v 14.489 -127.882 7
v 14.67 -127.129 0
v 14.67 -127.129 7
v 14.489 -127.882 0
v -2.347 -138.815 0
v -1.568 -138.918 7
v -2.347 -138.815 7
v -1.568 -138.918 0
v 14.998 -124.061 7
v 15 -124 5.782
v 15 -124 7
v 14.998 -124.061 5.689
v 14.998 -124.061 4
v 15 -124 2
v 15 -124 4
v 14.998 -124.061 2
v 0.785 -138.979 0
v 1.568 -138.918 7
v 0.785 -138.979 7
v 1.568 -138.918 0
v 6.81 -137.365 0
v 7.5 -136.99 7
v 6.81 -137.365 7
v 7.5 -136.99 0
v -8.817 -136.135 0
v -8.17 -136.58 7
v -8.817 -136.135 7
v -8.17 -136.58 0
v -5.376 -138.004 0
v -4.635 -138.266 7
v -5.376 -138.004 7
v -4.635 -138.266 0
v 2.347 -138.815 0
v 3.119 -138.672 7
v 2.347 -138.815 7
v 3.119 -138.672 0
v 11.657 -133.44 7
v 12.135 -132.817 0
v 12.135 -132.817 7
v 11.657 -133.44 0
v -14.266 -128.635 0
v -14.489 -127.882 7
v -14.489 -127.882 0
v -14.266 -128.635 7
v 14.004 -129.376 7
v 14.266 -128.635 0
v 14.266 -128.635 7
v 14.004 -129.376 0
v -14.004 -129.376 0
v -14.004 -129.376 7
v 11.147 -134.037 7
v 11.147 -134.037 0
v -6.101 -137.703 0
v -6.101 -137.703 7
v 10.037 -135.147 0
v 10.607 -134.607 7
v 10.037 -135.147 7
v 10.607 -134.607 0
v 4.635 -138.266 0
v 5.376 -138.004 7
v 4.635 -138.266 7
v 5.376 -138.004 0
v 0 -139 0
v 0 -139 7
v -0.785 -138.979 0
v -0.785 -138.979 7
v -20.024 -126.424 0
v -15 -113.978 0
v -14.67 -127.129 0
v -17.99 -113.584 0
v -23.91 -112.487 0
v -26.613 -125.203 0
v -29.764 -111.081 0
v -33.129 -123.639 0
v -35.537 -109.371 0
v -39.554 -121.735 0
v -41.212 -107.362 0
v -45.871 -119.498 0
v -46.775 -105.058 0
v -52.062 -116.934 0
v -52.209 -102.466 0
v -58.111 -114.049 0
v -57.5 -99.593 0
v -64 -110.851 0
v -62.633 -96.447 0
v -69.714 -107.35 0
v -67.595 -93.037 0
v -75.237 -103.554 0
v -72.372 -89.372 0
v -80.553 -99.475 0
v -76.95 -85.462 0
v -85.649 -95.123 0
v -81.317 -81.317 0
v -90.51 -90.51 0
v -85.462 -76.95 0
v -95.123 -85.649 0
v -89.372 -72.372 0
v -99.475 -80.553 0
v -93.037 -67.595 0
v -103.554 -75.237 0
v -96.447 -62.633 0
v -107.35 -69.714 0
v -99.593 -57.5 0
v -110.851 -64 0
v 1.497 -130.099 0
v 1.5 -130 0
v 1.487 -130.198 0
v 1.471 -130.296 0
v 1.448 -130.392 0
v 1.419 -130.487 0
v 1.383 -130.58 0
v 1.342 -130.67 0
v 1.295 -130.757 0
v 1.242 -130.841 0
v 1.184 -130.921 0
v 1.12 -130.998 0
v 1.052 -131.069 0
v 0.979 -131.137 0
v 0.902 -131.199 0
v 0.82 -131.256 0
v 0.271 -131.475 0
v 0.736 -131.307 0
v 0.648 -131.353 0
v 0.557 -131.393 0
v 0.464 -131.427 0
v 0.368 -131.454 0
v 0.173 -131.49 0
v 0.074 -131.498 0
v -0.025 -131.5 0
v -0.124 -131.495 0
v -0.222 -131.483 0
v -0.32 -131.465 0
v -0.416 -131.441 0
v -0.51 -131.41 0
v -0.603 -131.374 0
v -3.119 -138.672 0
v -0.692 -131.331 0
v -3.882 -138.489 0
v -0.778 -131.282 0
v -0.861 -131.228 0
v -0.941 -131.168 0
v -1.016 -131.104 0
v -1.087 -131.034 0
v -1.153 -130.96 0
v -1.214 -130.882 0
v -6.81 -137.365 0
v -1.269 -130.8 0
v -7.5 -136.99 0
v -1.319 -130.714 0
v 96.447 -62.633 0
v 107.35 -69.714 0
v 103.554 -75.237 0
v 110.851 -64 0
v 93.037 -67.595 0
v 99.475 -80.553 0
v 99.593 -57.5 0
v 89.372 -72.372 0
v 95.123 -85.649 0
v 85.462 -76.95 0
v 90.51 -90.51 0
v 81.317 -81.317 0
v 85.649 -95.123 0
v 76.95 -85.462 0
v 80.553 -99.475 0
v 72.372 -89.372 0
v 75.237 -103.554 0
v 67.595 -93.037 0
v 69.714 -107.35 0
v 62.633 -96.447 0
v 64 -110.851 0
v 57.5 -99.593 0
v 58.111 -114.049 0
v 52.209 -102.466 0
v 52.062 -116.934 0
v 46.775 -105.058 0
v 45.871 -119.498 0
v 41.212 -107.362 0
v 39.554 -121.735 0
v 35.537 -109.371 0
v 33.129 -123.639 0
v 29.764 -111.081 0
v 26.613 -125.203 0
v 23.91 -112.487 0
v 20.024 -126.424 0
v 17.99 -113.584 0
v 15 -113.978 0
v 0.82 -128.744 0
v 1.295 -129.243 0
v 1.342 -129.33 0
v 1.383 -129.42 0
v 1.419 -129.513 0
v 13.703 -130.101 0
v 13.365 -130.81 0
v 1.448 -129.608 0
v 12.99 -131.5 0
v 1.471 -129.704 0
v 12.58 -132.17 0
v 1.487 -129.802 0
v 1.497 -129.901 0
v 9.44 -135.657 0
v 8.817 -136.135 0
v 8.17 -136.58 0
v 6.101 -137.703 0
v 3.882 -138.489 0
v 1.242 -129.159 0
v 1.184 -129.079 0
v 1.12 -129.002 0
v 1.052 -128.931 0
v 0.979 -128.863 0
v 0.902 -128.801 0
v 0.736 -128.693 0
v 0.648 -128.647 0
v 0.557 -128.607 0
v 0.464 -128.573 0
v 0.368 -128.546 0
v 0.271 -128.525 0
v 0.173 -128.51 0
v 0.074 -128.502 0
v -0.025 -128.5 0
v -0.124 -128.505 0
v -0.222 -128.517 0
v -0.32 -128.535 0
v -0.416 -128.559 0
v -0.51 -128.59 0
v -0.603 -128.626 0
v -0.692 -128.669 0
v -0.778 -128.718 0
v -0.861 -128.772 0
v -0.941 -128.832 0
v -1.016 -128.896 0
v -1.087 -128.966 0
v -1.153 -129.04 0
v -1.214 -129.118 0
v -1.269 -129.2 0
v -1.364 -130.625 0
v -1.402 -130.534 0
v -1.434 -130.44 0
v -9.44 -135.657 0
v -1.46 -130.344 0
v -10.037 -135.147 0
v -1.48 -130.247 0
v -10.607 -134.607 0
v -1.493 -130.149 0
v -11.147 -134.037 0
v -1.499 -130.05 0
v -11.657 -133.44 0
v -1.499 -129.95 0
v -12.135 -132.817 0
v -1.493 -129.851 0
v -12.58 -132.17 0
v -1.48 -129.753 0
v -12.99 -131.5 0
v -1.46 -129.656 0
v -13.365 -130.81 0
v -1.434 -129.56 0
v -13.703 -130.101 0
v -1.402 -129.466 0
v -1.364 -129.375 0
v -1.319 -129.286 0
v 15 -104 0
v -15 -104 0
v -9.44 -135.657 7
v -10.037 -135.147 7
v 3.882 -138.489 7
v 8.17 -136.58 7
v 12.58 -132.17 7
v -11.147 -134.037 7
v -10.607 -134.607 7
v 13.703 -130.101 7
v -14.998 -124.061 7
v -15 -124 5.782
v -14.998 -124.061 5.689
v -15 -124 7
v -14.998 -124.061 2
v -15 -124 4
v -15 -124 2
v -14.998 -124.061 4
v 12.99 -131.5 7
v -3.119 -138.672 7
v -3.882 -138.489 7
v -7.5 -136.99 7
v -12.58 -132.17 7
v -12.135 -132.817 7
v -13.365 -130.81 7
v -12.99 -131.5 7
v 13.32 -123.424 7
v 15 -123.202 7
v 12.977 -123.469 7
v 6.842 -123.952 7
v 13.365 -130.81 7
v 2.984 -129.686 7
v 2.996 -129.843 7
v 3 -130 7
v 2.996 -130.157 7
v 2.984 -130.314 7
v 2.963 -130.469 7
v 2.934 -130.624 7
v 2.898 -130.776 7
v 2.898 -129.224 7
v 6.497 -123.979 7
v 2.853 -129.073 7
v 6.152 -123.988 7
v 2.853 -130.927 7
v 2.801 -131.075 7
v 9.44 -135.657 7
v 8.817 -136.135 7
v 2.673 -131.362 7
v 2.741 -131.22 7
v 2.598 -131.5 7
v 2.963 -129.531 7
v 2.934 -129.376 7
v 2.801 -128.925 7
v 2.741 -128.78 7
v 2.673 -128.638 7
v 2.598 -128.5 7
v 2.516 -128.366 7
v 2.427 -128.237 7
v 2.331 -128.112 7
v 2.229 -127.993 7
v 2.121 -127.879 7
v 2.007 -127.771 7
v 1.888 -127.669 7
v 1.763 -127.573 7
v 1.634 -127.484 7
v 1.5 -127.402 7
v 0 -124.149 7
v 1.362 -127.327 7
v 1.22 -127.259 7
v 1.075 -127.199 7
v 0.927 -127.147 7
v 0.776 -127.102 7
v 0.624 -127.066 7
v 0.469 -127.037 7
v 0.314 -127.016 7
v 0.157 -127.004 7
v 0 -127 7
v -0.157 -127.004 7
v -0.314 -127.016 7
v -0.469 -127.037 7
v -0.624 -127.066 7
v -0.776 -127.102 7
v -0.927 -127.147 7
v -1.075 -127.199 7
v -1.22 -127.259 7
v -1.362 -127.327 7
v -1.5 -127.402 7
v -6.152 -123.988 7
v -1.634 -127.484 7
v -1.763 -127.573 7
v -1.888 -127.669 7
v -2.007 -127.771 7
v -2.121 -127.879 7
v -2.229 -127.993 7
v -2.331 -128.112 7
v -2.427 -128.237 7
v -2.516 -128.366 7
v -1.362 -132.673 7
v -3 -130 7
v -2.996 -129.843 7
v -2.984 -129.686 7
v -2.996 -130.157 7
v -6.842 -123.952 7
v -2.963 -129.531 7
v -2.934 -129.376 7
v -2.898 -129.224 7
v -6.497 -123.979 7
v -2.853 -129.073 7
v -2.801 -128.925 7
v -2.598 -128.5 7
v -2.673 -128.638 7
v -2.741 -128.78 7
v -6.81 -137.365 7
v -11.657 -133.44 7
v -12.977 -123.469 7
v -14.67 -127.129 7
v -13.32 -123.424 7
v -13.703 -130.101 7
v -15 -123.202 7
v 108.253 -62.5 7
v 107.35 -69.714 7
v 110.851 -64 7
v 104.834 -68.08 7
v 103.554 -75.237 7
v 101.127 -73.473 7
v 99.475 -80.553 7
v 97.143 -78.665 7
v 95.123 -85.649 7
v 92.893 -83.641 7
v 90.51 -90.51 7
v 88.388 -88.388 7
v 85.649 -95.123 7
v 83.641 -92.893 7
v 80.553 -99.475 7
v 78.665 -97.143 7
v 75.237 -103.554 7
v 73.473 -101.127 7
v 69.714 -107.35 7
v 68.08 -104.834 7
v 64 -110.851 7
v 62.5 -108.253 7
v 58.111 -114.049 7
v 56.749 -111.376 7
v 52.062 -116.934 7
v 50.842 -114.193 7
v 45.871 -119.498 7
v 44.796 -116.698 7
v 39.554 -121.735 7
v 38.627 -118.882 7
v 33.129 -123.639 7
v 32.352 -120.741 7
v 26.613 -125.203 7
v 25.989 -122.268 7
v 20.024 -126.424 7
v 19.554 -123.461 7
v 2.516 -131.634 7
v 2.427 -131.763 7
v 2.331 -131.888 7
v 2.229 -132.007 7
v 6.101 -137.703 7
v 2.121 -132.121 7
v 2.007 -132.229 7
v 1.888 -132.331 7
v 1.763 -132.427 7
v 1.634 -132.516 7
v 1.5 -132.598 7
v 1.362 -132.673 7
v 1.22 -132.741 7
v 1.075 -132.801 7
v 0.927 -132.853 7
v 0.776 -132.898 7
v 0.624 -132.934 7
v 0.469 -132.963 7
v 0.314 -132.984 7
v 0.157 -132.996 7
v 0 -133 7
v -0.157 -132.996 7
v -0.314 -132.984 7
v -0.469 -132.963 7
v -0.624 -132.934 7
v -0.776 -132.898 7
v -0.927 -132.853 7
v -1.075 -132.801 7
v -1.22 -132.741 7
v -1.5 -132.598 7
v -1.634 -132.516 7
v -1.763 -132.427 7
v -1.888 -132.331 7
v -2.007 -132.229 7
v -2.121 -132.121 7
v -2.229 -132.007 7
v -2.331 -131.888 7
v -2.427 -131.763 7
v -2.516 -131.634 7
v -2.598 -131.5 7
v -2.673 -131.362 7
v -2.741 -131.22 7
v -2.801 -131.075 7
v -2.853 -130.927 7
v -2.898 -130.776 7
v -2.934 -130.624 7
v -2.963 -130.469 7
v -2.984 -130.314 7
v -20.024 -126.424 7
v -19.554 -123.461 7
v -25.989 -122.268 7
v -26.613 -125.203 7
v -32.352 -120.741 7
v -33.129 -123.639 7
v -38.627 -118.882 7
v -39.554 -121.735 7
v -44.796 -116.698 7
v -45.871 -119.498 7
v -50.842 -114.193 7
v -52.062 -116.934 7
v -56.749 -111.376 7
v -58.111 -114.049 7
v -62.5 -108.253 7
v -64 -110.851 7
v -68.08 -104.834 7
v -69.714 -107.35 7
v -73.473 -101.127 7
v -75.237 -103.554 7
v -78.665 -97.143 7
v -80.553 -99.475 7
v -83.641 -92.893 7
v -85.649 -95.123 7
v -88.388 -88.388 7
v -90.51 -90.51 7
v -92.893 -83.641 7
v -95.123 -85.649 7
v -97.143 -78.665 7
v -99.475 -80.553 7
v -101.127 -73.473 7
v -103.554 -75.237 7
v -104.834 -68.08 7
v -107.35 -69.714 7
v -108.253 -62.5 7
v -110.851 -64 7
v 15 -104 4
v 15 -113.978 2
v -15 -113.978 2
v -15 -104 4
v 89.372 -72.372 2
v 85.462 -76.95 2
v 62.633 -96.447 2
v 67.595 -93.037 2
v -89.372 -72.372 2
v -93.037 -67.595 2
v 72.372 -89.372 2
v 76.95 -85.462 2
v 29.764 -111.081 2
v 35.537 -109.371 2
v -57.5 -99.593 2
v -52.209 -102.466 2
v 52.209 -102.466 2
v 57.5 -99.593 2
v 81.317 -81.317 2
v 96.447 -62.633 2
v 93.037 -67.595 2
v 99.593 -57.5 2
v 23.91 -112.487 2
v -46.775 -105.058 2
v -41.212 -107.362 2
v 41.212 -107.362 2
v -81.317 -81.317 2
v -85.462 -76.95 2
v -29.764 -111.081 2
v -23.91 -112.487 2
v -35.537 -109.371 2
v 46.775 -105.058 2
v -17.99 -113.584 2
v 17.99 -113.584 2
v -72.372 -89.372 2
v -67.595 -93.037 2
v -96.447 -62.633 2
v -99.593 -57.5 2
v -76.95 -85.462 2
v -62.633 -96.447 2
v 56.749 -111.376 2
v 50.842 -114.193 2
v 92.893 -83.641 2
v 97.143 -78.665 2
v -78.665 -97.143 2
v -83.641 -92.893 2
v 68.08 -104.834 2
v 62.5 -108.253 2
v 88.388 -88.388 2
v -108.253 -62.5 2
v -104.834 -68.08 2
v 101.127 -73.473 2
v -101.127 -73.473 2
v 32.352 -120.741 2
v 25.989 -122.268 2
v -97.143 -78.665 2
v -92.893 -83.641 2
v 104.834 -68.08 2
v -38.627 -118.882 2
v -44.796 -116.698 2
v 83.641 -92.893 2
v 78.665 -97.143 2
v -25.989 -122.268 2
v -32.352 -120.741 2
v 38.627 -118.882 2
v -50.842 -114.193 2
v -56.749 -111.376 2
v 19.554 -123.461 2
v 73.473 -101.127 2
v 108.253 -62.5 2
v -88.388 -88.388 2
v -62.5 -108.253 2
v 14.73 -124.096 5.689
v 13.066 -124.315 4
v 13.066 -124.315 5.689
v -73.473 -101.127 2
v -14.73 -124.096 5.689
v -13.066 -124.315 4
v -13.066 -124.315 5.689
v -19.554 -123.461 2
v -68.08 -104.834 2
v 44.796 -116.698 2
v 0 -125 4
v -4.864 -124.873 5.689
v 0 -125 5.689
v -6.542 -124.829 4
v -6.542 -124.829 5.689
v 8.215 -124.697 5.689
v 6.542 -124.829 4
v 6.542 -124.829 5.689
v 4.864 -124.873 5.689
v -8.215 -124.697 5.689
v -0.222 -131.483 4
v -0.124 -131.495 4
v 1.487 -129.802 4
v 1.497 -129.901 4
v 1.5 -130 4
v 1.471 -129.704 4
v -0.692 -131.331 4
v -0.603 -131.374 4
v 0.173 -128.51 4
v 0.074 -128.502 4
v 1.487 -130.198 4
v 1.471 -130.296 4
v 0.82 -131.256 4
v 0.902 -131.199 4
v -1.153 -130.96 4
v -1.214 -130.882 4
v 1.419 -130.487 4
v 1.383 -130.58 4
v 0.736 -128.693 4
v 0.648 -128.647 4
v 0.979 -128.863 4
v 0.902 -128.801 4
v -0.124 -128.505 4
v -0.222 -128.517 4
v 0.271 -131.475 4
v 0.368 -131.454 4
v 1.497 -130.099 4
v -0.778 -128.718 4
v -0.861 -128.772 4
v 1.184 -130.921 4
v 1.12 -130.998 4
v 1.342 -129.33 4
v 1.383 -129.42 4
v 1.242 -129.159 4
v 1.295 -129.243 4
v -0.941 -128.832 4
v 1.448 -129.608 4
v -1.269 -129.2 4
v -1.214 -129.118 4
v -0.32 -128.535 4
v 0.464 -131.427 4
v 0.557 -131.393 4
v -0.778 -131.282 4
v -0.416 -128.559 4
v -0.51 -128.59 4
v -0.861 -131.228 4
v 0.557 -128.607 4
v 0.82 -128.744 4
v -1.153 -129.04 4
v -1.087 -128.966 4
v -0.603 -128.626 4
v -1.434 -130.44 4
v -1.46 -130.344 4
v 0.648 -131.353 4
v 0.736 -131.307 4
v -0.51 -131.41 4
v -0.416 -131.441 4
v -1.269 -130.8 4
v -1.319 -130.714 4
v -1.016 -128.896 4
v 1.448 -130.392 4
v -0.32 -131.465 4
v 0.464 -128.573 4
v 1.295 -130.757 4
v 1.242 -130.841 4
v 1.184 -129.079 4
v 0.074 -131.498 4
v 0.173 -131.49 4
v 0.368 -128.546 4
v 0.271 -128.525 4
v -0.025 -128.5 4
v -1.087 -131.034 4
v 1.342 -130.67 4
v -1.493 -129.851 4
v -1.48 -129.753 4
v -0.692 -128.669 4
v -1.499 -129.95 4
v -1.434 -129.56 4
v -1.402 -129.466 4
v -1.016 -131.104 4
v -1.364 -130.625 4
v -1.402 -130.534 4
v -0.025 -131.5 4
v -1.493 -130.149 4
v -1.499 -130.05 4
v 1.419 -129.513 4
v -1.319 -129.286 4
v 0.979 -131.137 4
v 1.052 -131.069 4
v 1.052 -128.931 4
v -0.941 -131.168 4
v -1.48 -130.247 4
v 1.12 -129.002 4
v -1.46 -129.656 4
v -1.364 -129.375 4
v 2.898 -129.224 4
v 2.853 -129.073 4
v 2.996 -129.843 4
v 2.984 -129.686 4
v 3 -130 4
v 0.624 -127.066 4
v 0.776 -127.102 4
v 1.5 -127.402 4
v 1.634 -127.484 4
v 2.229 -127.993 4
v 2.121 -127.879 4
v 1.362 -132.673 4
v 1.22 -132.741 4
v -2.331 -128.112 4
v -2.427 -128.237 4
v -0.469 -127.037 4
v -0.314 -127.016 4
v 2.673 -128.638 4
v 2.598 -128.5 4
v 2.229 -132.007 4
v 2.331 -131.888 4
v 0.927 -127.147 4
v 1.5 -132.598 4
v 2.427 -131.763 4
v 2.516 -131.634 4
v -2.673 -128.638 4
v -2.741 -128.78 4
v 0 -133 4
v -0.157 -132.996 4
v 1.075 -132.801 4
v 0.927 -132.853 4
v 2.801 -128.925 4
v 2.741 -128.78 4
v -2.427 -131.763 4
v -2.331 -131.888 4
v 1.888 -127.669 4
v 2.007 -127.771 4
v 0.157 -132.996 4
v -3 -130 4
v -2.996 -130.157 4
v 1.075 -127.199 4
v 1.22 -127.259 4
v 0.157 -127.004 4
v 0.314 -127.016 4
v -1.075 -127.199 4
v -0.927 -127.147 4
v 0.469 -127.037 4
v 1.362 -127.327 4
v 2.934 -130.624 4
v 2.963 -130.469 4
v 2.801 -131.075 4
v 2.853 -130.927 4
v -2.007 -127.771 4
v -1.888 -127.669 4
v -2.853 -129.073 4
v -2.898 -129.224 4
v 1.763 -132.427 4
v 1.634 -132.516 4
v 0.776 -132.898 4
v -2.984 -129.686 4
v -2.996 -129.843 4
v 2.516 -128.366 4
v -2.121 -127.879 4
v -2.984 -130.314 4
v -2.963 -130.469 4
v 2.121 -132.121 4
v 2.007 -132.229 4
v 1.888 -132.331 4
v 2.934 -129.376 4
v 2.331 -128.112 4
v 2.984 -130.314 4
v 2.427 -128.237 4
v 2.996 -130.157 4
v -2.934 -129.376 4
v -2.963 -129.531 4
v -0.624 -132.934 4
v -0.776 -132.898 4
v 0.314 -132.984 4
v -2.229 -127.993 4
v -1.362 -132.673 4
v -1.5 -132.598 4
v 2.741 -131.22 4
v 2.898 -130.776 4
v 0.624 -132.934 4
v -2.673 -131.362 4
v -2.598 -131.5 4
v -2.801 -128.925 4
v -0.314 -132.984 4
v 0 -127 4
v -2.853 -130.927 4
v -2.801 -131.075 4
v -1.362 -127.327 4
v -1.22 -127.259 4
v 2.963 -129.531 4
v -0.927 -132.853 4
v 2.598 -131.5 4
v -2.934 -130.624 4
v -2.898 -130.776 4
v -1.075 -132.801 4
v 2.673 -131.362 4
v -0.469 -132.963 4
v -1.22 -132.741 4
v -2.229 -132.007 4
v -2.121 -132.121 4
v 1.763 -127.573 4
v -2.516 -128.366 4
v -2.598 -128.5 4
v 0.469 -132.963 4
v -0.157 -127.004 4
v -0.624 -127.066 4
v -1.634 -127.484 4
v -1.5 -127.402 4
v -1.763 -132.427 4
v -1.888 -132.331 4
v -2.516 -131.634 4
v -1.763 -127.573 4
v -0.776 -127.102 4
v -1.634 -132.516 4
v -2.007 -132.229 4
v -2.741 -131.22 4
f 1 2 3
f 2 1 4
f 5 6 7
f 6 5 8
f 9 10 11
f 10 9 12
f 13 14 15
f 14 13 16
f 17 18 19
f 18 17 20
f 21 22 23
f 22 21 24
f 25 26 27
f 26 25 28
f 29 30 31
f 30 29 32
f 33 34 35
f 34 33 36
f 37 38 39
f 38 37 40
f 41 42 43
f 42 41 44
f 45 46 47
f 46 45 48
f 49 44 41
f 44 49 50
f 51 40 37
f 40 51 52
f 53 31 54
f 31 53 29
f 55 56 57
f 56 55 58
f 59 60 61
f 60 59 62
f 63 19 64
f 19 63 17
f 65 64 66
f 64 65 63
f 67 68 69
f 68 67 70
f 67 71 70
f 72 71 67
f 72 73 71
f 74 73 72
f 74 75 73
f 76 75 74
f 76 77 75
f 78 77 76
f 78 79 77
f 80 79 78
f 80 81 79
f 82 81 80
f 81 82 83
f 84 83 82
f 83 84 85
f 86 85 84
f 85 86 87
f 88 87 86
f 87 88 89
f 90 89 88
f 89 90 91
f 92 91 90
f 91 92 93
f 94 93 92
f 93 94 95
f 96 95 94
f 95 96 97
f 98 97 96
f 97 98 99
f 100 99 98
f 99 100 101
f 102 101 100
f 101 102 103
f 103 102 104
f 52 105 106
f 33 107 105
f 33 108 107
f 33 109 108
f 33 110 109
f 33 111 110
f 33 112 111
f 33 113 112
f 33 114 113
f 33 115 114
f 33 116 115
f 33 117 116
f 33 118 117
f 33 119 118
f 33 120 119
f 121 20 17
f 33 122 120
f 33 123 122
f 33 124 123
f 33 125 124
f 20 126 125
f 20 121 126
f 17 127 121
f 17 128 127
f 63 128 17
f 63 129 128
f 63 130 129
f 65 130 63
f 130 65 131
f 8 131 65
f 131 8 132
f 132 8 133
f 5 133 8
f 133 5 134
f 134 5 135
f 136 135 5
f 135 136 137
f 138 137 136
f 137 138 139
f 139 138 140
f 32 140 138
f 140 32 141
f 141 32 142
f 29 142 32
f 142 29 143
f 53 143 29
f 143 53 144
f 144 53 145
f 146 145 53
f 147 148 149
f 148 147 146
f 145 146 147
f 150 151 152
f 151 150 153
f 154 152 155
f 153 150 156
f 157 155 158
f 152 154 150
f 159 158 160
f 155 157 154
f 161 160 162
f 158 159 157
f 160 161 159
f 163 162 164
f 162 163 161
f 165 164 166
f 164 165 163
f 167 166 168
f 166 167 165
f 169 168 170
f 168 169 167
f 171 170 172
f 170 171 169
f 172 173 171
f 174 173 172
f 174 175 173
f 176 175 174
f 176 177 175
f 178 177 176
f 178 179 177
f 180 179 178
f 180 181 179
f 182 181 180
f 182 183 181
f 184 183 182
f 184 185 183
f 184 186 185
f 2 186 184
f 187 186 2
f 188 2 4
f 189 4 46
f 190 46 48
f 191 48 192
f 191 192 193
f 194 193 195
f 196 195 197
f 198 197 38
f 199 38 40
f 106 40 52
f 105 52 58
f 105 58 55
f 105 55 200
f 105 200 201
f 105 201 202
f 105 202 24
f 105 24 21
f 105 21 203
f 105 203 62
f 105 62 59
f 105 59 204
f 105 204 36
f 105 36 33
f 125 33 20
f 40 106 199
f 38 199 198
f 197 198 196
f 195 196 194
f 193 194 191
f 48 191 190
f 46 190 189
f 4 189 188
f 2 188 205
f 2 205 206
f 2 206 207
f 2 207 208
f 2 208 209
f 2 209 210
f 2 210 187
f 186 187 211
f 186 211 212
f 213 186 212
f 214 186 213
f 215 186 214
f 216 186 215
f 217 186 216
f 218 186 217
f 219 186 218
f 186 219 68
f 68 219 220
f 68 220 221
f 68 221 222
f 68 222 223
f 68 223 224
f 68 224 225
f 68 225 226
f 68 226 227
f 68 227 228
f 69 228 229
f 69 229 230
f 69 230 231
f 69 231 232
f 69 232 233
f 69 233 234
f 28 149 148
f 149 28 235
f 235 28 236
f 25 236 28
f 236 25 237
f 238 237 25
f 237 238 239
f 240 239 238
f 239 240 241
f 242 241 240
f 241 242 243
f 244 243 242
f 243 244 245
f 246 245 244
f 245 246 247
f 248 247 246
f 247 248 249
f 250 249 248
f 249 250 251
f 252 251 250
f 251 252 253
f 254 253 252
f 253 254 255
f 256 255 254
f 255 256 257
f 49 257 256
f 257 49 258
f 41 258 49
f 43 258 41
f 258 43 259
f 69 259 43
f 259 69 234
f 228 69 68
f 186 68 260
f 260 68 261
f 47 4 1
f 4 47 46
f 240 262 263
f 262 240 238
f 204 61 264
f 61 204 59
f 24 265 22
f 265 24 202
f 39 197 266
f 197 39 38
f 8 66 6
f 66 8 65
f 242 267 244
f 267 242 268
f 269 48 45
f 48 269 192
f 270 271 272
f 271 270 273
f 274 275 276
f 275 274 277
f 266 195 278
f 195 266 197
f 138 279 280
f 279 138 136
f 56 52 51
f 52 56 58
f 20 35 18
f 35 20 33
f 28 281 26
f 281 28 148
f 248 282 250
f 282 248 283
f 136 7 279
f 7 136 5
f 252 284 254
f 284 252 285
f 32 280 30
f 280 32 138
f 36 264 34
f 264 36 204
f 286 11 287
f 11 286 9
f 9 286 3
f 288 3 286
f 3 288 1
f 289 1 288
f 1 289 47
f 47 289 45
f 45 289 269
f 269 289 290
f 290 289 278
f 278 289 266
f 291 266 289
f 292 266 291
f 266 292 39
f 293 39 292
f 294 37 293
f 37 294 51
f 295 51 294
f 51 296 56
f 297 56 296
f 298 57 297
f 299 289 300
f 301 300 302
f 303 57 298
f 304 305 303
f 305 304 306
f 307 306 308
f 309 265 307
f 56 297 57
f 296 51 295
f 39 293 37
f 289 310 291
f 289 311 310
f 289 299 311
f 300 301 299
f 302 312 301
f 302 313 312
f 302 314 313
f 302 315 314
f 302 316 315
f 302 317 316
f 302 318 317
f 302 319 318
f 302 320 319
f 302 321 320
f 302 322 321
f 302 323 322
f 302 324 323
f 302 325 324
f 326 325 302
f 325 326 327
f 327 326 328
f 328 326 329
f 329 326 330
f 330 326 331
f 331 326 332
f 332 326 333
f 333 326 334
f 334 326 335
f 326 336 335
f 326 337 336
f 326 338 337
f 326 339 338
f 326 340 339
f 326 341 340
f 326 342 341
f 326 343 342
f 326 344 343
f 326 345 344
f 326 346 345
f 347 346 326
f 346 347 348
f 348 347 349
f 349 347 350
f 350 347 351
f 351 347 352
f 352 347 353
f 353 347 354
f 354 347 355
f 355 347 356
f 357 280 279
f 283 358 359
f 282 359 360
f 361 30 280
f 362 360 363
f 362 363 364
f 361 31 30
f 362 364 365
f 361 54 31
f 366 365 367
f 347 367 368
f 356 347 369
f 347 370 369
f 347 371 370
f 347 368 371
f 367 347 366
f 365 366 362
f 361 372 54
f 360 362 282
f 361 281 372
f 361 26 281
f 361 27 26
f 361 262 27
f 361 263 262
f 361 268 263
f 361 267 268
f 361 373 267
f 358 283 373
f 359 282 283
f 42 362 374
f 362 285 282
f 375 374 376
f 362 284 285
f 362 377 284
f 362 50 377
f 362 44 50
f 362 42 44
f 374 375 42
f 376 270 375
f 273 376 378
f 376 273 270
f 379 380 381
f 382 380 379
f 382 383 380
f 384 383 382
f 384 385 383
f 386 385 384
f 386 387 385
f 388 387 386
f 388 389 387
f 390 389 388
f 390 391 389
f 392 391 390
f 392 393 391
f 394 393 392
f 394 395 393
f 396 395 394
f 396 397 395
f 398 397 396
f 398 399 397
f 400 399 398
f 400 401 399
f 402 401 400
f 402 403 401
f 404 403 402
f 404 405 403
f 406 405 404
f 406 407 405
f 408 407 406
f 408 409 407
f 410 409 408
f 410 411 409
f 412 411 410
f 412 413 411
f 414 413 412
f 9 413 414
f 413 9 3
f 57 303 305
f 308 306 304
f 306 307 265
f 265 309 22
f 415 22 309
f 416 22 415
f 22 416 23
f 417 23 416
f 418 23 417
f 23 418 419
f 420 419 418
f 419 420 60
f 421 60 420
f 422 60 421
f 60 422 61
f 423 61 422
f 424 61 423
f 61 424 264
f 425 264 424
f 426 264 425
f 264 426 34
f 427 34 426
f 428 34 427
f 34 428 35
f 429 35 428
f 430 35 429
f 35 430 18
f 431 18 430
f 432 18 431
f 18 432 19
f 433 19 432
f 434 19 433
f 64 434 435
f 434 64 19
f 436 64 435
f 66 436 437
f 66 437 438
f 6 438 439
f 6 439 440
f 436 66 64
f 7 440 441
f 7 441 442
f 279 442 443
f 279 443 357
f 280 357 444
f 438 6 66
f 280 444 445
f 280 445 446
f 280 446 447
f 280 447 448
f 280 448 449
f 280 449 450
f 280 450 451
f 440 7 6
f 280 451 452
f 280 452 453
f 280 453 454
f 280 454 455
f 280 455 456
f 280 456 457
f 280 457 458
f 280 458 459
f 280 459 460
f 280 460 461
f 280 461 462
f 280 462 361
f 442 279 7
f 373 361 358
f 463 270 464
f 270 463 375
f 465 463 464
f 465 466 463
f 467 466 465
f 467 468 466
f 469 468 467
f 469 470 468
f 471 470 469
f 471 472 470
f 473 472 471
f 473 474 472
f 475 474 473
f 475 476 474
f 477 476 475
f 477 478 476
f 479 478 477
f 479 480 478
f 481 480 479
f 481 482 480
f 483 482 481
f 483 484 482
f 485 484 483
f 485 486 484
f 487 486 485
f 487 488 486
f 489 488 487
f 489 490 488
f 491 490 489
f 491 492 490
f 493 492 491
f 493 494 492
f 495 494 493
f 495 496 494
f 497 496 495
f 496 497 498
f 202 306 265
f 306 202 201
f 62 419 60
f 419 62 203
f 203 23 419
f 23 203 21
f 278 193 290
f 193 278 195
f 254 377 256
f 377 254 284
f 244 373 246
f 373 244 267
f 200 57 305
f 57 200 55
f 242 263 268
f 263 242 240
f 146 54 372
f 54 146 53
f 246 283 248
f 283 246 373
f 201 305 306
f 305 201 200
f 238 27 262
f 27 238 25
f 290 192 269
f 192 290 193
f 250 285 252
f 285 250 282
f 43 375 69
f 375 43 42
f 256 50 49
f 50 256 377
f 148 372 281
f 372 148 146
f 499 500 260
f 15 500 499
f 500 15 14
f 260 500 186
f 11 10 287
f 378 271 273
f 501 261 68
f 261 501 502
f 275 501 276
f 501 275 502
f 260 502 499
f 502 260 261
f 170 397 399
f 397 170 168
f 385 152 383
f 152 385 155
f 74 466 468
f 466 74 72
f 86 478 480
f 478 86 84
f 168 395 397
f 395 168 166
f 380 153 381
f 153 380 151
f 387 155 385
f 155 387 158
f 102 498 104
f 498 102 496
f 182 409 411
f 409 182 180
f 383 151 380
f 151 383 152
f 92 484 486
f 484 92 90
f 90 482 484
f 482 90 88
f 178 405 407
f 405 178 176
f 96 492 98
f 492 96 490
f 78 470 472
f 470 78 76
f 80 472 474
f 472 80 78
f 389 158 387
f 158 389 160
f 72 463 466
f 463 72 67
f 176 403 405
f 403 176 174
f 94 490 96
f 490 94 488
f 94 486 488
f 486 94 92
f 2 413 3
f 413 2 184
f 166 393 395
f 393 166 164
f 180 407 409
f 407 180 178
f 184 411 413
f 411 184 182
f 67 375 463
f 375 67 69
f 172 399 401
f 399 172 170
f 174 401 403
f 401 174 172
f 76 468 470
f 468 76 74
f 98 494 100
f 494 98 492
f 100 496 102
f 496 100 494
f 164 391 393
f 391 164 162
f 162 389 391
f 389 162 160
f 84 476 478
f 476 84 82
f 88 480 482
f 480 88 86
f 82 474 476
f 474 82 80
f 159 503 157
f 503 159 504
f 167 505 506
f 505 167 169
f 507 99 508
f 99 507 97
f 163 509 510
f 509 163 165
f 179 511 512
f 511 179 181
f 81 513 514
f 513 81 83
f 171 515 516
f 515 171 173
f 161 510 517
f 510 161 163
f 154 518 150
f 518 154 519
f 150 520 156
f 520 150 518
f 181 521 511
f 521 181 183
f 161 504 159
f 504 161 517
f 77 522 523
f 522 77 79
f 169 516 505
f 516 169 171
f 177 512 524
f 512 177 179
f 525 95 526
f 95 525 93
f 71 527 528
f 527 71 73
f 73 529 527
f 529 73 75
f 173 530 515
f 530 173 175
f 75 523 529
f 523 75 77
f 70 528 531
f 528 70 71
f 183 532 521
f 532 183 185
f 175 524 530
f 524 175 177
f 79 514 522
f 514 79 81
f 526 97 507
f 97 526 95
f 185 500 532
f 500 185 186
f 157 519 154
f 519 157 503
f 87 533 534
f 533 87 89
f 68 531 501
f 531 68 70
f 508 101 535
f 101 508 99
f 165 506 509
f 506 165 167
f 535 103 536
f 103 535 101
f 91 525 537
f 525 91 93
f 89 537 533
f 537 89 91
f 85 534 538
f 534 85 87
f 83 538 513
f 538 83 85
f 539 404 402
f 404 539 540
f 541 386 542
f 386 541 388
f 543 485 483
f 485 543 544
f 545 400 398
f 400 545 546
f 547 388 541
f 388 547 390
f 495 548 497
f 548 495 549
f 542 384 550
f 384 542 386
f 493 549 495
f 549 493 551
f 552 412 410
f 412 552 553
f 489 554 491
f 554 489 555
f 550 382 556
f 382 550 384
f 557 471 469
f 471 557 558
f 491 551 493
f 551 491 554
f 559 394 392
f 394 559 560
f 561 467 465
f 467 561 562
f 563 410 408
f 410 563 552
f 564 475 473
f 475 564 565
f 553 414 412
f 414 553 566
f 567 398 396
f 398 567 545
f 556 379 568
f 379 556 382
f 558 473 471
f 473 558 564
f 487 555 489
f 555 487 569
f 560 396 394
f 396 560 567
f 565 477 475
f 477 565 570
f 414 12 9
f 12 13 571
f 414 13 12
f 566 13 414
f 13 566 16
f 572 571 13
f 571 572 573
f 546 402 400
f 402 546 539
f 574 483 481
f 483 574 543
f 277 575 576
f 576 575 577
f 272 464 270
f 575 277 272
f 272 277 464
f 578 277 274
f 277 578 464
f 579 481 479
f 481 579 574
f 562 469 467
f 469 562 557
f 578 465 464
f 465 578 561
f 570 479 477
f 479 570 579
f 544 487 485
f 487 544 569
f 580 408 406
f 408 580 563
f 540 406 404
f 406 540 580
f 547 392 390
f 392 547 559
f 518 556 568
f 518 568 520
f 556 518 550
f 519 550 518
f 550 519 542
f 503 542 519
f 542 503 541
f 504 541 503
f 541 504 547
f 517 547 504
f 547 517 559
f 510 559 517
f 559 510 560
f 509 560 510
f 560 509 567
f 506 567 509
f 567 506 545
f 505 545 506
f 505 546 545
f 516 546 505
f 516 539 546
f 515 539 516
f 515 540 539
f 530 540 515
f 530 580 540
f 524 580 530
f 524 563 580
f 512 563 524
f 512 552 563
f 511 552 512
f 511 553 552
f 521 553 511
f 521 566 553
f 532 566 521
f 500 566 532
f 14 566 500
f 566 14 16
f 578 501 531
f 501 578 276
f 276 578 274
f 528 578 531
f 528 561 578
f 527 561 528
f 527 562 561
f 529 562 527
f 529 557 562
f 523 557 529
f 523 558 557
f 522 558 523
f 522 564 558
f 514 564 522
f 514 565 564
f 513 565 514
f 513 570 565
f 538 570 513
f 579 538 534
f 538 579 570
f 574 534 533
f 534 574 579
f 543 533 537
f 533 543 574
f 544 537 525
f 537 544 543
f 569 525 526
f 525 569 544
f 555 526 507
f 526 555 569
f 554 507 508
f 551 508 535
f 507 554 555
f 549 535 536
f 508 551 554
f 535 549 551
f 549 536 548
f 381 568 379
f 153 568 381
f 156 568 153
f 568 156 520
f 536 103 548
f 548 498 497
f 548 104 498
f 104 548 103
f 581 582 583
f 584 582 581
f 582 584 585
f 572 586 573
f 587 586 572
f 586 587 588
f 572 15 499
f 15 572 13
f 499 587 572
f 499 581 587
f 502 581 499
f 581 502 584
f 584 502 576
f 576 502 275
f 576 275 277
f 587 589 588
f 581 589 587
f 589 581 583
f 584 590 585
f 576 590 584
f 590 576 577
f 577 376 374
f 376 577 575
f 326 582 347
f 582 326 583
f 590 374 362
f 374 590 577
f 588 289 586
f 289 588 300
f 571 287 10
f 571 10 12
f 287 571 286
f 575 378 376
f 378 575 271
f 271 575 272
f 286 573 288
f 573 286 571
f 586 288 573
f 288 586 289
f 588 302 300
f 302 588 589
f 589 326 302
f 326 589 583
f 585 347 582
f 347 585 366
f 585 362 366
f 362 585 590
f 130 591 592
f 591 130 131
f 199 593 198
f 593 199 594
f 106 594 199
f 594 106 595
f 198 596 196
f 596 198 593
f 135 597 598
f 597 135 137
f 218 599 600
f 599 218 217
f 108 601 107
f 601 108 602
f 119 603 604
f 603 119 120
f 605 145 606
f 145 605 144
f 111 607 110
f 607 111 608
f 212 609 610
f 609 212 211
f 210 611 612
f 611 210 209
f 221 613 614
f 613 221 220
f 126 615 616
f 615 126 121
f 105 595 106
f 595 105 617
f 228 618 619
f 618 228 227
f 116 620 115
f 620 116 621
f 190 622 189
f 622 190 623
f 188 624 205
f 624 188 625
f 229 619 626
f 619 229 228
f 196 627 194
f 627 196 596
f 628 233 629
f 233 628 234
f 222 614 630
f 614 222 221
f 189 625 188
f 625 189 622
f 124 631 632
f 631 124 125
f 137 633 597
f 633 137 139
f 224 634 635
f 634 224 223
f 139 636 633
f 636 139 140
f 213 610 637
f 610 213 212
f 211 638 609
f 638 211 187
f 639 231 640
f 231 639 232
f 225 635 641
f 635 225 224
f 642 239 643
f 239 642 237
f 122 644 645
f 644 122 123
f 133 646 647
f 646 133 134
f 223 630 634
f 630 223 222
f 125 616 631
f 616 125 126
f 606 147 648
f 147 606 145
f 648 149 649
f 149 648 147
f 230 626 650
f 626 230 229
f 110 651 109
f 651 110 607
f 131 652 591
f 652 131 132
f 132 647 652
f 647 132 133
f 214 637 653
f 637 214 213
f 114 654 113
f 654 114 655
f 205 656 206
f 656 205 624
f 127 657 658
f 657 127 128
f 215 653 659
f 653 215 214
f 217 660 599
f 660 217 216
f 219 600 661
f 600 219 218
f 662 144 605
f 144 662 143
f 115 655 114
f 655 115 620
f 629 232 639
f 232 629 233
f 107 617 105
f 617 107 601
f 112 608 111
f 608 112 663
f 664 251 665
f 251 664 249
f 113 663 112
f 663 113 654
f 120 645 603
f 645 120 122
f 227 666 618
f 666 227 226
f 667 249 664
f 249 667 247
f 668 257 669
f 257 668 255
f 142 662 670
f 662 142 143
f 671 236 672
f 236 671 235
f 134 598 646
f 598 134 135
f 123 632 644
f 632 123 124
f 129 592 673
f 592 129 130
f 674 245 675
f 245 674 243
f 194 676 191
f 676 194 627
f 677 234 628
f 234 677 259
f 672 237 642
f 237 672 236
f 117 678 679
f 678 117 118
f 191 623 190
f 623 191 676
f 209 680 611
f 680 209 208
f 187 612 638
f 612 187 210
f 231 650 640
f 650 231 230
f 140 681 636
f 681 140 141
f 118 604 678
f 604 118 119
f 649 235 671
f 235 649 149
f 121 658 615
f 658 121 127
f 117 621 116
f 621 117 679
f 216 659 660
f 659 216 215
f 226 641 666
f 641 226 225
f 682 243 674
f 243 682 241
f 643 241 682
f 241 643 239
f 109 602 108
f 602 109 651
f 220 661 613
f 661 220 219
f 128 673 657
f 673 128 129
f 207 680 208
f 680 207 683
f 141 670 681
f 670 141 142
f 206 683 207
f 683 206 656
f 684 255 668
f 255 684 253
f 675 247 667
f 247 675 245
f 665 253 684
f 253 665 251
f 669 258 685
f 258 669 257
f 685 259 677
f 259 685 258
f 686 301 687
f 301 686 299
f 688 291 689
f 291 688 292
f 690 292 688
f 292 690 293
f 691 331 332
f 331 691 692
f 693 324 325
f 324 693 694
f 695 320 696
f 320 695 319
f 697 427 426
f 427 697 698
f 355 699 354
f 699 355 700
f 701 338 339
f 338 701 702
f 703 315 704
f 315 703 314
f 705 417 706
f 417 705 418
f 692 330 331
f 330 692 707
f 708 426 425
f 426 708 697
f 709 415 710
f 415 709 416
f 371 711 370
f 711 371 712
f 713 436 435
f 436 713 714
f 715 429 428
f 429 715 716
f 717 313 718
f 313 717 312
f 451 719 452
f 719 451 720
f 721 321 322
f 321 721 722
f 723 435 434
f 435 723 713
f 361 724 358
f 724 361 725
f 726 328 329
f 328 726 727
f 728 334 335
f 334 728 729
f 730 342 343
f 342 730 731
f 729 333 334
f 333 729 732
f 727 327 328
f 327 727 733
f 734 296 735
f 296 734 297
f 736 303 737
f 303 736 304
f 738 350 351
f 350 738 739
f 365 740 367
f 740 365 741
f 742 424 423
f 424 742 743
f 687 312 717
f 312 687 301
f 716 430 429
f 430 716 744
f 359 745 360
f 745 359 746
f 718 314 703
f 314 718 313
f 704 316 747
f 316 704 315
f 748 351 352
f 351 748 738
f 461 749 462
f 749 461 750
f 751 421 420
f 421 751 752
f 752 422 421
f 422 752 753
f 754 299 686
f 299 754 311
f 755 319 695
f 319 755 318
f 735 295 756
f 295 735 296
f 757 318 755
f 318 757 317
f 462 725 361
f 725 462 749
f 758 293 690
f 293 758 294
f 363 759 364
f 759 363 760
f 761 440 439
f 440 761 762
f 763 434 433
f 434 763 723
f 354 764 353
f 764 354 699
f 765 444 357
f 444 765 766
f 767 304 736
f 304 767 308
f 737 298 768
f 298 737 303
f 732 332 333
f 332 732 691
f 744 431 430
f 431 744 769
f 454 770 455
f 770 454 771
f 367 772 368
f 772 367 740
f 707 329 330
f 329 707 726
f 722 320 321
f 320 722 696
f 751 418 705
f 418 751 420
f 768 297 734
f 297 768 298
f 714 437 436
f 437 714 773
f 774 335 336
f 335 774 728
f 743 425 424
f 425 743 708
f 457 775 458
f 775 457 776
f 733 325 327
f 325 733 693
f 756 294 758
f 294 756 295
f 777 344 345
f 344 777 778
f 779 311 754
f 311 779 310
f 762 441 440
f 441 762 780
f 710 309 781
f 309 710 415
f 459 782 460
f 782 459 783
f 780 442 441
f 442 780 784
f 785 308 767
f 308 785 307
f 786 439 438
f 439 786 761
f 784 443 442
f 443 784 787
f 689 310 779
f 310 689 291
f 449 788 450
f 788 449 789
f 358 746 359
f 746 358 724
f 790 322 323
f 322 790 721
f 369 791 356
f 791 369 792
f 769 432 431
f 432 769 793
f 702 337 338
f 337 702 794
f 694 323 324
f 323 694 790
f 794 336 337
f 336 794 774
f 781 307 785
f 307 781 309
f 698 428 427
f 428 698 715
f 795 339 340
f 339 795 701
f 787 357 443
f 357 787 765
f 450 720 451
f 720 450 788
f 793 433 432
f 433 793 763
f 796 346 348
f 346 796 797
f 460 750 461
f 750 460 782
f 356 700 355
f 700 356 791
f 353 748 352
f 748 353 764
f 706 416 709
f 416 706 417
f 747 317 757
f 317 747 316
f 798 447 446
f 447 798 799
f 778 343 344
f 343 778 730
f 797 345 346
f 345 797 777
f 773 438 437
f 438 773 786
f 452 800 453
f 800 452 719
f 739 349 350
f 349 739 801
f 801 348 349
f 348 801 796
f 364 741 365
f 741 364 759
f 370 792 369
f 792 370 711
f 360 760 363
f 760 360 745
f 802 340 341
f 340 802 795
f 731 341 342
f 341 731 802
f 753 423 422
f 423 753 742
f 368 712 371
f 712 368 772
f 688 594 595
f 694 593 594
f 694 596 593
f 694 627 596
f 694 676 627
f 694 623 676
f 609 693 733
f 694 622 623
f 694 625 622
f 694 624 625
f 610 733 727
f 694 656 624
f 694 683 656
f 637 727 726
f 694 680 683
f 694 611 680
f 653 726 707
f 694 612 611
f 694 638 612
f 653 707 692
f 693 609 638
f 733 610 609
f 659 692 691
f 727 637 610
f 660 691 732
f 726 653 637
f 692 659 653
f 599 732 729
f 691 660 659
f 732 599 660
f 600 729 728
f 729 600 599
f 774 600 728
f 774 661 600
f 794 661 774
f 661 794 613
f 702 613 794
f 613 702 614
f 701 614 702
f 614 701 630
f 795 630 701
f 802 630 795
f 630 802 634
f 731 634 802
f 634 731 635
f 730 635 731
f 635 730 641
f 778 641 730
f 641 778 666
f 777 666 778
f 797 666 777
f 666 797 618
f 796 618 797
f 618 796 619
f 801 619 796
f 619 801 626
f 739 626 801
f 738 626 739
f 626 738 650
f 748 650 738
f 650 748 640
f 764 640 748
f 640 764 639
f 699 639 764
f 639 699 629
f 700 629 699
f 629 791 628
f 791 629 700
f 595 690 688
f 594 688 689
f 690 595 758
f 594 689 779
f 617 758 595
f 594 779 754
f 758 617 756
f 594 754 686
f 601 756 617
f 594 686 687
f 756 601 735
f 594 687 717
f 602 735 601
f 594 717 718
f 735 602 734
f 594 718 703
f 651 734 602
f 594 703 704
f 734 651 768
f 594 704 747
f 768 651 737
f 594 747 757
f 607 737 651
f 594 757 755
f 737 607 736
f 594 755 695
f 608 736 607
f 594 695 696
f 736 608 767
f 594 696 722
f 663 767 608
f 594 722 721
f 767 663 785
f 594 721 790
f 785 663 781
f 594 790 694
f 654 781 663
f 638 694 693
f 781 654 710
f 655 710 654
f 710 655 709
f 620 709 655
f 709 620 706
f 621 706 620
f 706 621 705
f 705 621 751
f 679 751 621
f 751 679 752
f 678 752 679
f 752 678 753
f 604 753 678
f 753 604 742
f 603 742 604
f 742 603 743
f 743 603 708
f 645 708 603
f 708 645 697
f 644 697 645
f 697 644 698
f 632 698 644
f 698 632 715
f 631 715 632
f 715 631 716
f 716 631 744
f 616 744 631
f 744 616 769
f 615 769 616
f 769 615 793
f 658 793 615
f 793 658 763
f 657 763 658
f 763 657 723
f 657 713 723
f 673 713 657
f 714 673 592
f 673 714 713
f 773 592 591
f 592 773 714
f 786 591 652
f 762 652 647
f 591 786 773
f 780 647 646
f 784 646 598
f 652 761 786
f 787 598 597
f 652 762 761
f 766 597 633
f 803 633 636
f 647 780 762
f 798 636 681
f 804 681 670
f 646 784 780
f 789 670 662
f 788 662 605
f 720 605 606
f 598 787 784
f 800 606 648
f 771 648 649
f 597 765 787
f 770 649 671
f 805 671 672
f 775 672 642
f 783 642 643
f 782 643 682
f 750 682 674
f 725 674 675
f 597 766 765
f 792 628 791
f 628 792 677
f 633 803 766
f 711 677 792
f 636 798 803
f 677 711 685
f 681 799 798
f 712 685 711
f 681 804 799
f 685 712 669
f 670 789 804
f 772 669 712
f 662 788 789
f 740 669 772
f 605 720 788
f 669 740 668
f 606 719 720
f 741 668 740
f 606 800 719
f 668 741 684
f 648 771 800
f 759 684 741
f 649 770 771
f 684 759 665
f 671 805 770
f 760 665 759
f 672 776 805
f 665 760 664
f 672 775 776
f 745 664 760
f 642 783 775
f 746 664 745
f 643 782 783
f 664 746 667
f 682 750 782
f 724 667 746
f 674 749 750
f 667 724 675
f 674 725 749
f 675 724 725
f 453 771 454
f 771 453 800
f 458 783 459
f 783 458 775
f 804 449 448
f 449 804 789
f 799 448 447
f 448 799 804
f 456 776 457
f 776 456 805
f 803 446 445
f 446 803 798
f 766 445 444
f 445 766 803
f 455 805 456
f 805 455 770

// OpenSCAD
$fa=3;
$fs=0.1;

bed_diameter = 250;
bed_height = 3;
clamp_height = 7;

//demo();
bed_clamp();

module demo() {
    %translate([0,0,clamp_height/2]) bed_mold();
    bed_clamp();
    rotate([0,0,120]) bed_clamp();
    rotate([0,0,240]) bed_clamp();
}

module bed_mold() {
    translate([0,0,bed_height/2])
        intersection() {
            translate([0,0,0.1])cylinder(d=bed_diameter, h=bed_height+0.2, center=true);
            translate([0,0,-bed_diameter/3]) sphere(d=bed_diameter*1.203);
        }
}

module bed_clamp() {
    width = 30;
    hole_diameter = 3;
    hole_screw_diameter = 6;
    bottom_length = 20;
    module body_mold() {
        translate([0,0,clamp_height/2]) {
            cylinder(d=width, h=clamp_height, center=true);
            translate([0,bottom_length/2,0])
                cube([width,bottom_length,clamp_height], center=true);
        }
    }
    module hole_mold() {
        translate([0,-6,clamp_height/2]) {
            cylinder(d=hole_diameter, h=clamp_height+1, center=true);
            translate([0,0,clamp_height-bed_height])
                cylinder(d=hole_screw_diameter, h=clamp_height, center=true);
        }
    }
    module edge() {
        translate([0,0,clamp_height/2])
            difference() {
                cylinder(d=bed_diameter+6,h=clamp_height, center=true);
                cylinder(d=bed_diameter-20,h=clamp_height+1, center=true);
                translate([0,0,2]) cylinder(d=bed_diameter,h=clamp_height, center=true);
            }
    }
    module pie() {
        intersection() {
            edge();
            rotate([0,0,60])translate([-500,0,0]) cube([1000,1000,1000],true);
            rotate([0,0,-60])translate([500,0,0]) cube([1000,1000,1000],true);
        }
    }
    difference() {
        union() {
            translate([0,-bed_diameter/2+1,0]) body_mold();
            pie();
        }
        translate([0,0,clamp_height-bed_height]) bed_mold();
        translate([0,-bed_diameter/2+1,0]) hole_mold();
    }
}
